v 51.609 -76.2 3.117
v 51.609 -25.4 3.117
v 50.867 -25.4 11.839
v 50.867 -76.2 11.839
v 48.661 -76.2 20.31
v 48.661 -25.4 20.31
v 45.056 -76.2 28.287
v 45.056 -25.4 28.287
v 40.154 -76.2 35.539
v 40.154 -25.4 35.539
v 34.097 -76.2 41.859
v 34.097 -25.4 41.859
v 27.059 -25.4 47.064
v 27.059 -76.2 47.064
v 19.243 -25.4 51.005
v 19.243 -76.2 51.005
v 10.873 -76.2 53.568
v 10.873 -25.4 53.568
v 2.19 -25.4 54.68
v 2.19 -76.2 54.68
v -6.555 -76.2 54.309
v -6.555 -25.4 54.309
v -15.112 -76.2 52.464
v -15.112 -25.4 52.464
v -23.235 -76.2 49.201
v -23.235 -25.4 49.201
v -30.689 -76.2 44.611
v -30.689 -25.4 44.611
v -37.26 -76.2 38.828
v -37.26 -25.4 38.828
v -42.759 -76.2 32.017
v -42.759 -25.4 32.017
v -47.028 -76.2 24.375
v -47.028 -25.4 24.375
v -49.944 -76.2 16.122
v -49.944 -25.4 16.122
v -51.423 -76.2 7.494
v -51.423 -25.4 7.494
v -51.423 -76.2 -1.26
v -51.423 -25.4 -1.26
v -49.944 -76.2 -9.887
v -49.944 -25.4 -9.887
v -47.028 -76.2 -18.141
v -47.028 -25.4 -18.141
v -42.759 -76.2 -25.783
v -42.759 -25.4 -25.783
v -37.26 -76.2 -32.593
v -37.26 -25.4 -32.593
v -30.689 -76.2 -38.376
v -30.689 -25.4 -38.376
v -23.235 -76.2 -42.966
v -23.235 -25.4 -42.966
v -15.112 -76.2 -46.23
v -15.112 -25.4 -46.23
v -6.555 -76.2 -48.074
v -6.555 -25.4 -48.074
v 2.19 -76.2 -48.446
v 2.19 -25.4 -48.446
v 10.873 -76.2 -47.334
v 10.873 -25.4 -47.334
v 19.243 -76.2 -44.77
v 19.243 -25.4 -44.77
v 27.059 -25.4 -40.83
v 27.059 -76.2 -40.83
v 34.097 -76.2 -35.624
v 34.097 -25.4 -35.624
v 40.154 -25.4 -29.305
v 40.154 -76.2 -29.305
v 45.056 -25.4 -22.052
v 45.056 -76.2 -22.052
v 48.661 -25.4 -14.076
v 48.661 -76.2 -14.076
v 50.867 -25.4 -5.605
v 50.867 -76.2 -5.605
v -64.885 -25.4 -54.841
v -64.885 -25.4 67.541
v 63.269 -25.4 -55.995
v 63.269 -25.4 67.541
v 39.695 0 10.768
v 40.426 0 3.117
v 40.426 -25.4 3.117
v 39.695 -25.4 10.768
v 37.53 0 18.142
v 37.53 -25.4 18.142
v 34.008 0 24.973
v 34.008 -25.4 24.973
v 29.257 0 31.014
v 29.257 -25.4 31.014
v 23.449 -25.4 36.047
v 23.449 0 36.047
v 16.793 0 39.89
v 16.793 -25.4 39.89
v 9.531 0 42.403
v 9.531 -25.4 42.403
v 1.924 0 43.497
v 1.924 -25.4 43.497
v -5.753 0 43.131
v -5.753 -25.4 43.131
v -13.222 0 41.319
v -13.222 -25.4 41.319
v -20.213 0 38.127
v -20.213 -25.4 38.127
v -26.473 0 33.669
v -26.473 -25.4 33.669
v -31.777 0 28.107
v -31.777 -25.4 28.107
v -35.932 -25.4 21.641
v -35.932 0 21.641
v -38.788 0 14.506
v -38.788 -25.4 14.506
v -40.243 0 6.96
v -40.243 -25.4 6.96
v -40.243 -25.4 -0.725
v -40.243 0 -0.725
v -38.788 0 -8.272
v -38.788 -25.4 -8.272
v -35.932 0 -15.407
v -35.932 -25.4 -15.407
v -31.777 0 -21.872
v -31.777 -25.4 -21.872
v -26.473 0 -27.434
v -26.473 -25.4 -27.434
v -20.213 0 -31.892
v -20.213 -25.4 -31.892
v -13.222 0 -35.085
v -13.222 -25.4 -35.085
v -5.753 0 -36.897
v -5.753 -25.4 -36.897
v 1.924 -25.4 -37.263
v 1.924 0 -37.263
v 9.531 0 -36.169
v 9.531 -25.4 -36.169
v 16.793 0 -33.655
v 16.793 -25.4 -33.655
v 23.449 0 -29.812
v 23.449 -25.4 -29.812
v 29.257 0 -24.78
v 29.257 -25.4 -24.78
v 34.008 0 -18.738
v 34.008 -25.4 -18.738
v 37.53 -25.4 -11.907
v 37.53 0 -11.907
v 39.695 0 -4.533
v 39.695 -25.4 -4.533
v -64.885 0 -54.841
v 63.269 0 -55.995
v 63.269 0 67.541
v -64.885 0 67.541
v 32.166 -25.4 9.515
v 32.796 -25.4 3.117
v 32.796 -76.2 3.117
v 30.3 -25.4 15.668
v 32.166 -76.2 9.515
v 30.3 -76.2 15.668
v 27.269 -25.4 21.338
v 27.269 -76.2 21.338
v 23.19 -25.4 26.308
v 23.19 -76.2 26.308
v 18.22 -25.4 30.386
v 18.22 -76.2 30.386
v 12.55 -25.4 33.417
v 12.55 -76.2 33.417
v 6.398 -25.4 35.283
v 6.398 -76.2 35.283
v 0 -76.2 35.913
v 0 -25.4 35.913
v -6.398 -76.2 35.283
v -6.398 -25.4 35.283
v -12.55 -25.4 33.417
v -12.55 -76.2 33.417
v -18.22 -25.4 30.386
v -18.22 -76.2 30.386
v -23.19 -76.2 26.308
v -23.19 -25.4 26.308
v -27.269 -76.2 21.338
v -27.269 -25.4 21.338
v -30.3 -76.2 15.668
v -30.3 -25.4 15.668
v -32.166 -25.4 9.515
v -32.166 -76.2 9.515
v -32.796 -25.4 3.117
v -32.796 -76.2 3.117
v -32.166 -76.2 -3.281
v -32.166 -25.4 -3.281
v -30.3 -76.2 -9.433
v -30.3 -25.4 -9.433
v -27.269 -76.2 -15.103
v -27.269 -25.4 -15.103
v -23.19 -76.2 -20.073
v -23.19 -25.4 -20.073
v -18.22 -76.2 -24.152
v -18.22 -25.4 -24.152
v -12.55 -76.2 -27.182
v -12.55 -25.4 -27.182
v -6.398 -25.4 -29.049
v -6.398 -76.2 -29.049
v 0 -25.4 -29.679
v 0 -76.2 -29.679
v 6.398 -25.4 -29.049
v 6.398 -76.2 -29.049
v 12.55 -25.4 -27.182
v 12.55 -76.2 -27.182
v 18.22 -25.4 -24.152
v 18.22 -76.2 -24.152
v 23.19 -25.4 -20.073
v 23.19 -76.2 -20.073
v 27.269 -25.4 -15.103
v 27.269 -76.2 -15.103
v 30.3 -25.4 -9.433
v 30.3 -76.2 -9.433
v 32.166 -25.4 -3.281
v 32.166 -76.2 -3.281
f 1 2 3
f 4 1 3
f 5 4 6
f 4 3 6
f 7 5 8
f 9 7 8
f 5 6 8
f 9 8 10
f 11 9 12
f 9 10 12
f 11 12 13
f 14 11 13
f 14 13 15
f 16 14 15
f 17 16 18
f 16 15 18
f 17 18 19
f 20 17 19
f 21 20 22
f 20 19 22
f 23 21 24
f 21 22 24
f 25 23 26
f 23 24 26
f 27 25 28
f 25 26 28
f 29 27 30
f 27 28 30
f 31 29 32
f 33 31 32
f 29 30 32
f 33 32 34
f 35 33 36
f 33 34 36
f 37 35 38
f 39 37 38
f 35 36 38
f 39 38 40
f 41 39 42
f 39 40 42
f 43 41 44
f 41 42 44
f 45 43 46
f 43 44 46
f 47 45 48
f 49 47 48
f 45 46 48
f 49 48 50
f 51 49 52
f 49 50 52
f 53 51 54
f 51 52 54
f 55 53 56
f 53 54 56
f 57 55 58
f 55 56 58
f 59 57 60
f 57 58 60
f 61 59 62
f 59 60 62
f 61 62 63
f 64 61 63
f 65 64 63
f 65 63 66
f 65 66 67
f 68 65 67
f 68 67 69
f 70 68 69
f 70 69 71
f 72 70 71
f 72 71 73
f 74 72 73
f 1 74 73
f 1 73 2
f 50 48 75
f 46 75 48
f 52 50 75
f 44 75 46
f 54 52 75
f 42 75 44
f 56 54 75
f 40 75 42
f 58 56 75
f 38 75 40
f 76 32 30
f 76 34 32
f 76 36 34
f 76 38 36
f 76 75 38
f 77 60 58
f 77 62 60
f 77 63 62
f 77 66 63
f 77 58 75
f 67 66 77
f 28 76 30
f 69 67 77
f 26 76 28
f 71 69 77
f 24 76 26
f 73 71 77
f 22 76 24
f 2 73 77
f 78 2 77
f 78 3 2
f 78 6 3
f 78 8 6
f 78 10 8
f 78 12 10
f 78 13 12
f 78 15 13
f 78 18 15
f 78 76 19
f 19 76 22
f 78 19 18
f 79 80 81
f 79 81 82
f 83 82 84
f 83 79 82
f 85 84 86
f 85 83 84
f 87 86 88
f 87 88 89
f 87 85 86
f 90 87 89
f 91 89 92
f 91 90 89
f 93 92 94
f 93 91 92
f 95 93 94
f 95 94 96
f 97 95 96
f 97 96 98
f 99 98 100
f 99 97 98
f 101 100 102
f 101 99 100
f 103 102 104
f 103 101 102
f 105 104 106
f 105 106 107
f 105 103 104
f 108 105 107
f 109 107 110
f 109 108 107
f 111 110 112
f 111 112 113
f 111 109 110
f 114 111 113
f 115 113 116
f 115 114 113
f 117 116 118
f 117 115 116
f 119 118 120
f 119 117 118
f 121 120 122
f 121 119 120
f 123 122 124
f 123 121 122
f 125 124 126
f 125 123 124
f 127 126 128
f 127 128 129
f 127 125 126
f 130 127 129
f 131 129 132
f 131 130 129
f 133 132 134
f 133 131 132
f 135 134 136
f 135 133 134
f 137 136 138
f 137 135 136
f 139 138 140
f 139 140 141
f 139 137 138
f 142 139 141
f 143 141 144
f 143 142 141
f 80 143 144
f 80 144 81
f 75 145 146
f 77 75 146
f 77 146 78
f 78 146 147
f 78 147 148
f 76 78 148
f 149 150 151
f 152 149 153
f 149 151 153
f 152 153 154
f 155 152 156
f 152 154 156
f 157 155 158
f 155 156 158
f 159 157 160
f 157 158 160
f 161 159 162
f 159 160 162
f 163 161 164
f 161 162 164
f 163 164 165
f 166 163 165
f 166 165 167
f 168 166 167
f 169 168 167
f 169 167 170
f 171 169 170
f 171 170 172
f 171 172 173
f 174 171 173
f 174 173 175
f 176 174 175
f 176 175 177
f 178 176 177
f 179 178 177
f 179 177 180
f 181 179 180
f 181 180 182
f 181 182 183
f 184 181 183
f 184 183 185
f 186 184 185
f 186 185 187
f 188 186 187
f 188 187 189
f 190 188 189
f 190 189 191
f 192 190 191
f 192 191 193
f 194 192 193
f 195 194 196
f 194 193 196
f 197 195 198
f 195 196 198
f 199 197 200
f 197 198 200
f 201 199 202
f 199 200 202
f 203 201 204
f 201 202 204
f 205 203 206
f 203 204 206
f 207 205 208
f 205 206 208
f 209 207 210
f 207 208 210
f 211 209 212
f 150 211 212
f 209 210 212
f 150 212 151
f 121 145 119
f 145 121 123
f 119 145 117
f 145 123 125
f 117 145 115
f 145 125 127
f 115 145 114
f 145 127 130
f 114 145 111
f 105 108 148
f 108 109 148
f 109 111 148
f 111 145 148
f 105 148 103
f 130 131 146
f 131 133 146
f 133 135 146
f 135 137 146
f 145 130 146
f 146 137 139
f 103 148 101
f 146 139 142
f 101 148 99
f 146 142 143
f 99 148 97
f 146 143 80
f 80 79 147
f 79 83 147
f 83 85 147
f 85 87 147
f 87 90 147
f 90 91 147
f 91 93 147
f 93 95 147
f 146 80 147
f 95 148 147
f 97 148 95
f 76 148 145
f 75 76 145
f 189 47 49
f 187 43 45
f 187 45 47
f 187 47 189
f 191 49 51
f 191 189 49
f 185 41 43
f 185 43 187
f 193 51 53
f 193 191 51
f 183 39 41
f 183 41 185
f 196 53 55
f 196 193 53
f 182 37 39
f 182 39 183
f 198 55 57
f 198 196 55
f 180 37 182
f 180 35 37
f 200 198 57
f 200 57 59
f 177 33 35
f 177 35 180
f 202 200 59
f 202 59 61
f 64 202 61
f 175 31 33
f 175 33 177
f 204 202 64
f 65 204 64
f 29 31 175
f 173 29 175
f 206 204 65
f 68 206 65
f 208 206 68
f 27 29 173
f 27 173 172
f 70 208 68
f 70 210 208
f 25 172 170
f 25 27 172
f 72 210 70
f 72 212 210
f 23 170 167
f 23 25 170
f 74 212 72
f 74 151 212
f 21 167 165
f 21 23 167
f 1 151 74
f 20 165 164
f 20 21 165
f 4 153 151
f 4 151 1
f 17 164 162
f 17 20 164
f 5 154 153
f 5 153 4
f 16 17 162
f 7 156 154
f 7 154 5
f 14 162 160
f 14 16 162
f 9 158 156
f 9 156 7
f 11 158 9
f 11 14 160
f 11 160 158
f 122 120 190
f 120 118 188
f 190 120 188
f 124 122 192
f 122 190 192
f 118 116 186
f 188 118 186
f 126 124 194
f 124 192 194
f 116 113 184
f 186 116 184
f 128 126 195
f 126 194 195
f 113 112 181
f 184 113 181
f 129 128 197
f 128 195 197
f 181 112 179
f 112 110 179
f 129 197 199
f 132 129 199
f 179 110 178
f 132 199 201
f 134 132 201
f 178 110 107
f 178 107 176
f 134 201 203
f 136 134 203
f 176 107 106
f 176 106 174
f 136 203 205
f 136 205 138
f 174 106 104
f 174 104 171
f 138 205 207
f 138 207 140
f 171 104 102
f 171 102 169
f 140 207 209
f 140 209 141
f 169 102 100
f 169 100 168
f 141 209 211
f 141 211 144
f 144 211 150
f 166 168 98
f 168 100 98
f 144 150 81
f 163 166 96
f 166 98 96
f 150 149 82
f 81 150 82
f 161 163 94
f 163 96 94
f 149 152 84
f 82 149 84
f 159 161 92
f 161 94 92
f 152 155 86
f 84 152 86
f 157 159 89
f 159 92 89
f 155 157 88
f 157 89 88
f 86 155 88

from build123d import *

# Parameters (mm, degrees)
F1_R     = 40.425581
F2_DEPTH = 25.4
F3_R     = 51.609341
F4_DEPTH = 50.8
F5_R     = 32.796001
F6_DEPTH = 76.2


with BuildPart() as f2:
    # F1 (on face) → F2 (new body)
    with BuildSketch(Plane.XZ):
        Polygon((63.269094, -55.995453), (63.269094, 67.540914), (-64.885452, 67.540914), (-64.885452, 55.995453), (-64.885452, -54.840911), align=None)
        with Locations((0, 3.117273)):
            Circle(F1_R, mode=Mode.SUBTRACT)
    extrude(amount=F2_DEPTH)

    # F3 (on face) → F4 (join)
    with BuildSketch(Plane.XZ.offset(25.4)):
        with Locations((0, 3.117273)):
            Circle(F3_R)
    extrude(amount=F4_DEPTH)

    # F5 (on face) → F6 (cut)
    with BuildSketch(Plane.XZ.offset(76.2)):
        with Locations((0, 3.117273)):
            Circle(F5_R)
    extrude(amount=-F6_DEPTH, mode=Mode.SUBTRACT)


solid = f2.part
